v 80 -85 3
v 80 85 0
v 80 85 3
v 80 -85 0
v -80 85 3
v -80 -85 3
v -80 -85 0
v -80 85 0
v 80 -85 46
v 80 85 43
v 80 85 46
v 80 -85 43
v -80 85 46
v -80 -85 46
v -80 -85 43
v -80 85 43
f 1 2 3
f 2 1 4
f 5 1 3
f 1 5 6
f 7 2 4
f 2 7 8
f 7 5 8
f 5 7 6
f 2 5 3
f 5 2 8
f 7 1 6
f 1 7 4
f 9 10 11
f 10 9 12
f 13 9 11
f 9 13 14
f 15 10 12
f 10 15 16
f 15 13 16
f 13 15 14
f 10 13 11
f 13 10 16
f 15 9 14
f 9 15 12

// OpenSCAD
// Assieme grezzo dei due piani: solo quote confermate.
// Nessun foro e nessuna colonnina vengono aggiunti senza autorizzazione.
// Unita: millimetri.

piano_lunghezza = 170;
piano_larghezza = 160;
piano_spessore = 3;
luce_tra_piani = 40;

module piano() {
    translate([-piano_larghezza / 2, -piano_lunghezza / 2, 0])
        cube([piano_larghezza, piano_lunghezza, piano_spessore]);
}

color("LightSteelBlue")
    piano();

color("Gainsboro")
    translate([0, 0, piano_spessore + luce_tra_piani])
        piano();
